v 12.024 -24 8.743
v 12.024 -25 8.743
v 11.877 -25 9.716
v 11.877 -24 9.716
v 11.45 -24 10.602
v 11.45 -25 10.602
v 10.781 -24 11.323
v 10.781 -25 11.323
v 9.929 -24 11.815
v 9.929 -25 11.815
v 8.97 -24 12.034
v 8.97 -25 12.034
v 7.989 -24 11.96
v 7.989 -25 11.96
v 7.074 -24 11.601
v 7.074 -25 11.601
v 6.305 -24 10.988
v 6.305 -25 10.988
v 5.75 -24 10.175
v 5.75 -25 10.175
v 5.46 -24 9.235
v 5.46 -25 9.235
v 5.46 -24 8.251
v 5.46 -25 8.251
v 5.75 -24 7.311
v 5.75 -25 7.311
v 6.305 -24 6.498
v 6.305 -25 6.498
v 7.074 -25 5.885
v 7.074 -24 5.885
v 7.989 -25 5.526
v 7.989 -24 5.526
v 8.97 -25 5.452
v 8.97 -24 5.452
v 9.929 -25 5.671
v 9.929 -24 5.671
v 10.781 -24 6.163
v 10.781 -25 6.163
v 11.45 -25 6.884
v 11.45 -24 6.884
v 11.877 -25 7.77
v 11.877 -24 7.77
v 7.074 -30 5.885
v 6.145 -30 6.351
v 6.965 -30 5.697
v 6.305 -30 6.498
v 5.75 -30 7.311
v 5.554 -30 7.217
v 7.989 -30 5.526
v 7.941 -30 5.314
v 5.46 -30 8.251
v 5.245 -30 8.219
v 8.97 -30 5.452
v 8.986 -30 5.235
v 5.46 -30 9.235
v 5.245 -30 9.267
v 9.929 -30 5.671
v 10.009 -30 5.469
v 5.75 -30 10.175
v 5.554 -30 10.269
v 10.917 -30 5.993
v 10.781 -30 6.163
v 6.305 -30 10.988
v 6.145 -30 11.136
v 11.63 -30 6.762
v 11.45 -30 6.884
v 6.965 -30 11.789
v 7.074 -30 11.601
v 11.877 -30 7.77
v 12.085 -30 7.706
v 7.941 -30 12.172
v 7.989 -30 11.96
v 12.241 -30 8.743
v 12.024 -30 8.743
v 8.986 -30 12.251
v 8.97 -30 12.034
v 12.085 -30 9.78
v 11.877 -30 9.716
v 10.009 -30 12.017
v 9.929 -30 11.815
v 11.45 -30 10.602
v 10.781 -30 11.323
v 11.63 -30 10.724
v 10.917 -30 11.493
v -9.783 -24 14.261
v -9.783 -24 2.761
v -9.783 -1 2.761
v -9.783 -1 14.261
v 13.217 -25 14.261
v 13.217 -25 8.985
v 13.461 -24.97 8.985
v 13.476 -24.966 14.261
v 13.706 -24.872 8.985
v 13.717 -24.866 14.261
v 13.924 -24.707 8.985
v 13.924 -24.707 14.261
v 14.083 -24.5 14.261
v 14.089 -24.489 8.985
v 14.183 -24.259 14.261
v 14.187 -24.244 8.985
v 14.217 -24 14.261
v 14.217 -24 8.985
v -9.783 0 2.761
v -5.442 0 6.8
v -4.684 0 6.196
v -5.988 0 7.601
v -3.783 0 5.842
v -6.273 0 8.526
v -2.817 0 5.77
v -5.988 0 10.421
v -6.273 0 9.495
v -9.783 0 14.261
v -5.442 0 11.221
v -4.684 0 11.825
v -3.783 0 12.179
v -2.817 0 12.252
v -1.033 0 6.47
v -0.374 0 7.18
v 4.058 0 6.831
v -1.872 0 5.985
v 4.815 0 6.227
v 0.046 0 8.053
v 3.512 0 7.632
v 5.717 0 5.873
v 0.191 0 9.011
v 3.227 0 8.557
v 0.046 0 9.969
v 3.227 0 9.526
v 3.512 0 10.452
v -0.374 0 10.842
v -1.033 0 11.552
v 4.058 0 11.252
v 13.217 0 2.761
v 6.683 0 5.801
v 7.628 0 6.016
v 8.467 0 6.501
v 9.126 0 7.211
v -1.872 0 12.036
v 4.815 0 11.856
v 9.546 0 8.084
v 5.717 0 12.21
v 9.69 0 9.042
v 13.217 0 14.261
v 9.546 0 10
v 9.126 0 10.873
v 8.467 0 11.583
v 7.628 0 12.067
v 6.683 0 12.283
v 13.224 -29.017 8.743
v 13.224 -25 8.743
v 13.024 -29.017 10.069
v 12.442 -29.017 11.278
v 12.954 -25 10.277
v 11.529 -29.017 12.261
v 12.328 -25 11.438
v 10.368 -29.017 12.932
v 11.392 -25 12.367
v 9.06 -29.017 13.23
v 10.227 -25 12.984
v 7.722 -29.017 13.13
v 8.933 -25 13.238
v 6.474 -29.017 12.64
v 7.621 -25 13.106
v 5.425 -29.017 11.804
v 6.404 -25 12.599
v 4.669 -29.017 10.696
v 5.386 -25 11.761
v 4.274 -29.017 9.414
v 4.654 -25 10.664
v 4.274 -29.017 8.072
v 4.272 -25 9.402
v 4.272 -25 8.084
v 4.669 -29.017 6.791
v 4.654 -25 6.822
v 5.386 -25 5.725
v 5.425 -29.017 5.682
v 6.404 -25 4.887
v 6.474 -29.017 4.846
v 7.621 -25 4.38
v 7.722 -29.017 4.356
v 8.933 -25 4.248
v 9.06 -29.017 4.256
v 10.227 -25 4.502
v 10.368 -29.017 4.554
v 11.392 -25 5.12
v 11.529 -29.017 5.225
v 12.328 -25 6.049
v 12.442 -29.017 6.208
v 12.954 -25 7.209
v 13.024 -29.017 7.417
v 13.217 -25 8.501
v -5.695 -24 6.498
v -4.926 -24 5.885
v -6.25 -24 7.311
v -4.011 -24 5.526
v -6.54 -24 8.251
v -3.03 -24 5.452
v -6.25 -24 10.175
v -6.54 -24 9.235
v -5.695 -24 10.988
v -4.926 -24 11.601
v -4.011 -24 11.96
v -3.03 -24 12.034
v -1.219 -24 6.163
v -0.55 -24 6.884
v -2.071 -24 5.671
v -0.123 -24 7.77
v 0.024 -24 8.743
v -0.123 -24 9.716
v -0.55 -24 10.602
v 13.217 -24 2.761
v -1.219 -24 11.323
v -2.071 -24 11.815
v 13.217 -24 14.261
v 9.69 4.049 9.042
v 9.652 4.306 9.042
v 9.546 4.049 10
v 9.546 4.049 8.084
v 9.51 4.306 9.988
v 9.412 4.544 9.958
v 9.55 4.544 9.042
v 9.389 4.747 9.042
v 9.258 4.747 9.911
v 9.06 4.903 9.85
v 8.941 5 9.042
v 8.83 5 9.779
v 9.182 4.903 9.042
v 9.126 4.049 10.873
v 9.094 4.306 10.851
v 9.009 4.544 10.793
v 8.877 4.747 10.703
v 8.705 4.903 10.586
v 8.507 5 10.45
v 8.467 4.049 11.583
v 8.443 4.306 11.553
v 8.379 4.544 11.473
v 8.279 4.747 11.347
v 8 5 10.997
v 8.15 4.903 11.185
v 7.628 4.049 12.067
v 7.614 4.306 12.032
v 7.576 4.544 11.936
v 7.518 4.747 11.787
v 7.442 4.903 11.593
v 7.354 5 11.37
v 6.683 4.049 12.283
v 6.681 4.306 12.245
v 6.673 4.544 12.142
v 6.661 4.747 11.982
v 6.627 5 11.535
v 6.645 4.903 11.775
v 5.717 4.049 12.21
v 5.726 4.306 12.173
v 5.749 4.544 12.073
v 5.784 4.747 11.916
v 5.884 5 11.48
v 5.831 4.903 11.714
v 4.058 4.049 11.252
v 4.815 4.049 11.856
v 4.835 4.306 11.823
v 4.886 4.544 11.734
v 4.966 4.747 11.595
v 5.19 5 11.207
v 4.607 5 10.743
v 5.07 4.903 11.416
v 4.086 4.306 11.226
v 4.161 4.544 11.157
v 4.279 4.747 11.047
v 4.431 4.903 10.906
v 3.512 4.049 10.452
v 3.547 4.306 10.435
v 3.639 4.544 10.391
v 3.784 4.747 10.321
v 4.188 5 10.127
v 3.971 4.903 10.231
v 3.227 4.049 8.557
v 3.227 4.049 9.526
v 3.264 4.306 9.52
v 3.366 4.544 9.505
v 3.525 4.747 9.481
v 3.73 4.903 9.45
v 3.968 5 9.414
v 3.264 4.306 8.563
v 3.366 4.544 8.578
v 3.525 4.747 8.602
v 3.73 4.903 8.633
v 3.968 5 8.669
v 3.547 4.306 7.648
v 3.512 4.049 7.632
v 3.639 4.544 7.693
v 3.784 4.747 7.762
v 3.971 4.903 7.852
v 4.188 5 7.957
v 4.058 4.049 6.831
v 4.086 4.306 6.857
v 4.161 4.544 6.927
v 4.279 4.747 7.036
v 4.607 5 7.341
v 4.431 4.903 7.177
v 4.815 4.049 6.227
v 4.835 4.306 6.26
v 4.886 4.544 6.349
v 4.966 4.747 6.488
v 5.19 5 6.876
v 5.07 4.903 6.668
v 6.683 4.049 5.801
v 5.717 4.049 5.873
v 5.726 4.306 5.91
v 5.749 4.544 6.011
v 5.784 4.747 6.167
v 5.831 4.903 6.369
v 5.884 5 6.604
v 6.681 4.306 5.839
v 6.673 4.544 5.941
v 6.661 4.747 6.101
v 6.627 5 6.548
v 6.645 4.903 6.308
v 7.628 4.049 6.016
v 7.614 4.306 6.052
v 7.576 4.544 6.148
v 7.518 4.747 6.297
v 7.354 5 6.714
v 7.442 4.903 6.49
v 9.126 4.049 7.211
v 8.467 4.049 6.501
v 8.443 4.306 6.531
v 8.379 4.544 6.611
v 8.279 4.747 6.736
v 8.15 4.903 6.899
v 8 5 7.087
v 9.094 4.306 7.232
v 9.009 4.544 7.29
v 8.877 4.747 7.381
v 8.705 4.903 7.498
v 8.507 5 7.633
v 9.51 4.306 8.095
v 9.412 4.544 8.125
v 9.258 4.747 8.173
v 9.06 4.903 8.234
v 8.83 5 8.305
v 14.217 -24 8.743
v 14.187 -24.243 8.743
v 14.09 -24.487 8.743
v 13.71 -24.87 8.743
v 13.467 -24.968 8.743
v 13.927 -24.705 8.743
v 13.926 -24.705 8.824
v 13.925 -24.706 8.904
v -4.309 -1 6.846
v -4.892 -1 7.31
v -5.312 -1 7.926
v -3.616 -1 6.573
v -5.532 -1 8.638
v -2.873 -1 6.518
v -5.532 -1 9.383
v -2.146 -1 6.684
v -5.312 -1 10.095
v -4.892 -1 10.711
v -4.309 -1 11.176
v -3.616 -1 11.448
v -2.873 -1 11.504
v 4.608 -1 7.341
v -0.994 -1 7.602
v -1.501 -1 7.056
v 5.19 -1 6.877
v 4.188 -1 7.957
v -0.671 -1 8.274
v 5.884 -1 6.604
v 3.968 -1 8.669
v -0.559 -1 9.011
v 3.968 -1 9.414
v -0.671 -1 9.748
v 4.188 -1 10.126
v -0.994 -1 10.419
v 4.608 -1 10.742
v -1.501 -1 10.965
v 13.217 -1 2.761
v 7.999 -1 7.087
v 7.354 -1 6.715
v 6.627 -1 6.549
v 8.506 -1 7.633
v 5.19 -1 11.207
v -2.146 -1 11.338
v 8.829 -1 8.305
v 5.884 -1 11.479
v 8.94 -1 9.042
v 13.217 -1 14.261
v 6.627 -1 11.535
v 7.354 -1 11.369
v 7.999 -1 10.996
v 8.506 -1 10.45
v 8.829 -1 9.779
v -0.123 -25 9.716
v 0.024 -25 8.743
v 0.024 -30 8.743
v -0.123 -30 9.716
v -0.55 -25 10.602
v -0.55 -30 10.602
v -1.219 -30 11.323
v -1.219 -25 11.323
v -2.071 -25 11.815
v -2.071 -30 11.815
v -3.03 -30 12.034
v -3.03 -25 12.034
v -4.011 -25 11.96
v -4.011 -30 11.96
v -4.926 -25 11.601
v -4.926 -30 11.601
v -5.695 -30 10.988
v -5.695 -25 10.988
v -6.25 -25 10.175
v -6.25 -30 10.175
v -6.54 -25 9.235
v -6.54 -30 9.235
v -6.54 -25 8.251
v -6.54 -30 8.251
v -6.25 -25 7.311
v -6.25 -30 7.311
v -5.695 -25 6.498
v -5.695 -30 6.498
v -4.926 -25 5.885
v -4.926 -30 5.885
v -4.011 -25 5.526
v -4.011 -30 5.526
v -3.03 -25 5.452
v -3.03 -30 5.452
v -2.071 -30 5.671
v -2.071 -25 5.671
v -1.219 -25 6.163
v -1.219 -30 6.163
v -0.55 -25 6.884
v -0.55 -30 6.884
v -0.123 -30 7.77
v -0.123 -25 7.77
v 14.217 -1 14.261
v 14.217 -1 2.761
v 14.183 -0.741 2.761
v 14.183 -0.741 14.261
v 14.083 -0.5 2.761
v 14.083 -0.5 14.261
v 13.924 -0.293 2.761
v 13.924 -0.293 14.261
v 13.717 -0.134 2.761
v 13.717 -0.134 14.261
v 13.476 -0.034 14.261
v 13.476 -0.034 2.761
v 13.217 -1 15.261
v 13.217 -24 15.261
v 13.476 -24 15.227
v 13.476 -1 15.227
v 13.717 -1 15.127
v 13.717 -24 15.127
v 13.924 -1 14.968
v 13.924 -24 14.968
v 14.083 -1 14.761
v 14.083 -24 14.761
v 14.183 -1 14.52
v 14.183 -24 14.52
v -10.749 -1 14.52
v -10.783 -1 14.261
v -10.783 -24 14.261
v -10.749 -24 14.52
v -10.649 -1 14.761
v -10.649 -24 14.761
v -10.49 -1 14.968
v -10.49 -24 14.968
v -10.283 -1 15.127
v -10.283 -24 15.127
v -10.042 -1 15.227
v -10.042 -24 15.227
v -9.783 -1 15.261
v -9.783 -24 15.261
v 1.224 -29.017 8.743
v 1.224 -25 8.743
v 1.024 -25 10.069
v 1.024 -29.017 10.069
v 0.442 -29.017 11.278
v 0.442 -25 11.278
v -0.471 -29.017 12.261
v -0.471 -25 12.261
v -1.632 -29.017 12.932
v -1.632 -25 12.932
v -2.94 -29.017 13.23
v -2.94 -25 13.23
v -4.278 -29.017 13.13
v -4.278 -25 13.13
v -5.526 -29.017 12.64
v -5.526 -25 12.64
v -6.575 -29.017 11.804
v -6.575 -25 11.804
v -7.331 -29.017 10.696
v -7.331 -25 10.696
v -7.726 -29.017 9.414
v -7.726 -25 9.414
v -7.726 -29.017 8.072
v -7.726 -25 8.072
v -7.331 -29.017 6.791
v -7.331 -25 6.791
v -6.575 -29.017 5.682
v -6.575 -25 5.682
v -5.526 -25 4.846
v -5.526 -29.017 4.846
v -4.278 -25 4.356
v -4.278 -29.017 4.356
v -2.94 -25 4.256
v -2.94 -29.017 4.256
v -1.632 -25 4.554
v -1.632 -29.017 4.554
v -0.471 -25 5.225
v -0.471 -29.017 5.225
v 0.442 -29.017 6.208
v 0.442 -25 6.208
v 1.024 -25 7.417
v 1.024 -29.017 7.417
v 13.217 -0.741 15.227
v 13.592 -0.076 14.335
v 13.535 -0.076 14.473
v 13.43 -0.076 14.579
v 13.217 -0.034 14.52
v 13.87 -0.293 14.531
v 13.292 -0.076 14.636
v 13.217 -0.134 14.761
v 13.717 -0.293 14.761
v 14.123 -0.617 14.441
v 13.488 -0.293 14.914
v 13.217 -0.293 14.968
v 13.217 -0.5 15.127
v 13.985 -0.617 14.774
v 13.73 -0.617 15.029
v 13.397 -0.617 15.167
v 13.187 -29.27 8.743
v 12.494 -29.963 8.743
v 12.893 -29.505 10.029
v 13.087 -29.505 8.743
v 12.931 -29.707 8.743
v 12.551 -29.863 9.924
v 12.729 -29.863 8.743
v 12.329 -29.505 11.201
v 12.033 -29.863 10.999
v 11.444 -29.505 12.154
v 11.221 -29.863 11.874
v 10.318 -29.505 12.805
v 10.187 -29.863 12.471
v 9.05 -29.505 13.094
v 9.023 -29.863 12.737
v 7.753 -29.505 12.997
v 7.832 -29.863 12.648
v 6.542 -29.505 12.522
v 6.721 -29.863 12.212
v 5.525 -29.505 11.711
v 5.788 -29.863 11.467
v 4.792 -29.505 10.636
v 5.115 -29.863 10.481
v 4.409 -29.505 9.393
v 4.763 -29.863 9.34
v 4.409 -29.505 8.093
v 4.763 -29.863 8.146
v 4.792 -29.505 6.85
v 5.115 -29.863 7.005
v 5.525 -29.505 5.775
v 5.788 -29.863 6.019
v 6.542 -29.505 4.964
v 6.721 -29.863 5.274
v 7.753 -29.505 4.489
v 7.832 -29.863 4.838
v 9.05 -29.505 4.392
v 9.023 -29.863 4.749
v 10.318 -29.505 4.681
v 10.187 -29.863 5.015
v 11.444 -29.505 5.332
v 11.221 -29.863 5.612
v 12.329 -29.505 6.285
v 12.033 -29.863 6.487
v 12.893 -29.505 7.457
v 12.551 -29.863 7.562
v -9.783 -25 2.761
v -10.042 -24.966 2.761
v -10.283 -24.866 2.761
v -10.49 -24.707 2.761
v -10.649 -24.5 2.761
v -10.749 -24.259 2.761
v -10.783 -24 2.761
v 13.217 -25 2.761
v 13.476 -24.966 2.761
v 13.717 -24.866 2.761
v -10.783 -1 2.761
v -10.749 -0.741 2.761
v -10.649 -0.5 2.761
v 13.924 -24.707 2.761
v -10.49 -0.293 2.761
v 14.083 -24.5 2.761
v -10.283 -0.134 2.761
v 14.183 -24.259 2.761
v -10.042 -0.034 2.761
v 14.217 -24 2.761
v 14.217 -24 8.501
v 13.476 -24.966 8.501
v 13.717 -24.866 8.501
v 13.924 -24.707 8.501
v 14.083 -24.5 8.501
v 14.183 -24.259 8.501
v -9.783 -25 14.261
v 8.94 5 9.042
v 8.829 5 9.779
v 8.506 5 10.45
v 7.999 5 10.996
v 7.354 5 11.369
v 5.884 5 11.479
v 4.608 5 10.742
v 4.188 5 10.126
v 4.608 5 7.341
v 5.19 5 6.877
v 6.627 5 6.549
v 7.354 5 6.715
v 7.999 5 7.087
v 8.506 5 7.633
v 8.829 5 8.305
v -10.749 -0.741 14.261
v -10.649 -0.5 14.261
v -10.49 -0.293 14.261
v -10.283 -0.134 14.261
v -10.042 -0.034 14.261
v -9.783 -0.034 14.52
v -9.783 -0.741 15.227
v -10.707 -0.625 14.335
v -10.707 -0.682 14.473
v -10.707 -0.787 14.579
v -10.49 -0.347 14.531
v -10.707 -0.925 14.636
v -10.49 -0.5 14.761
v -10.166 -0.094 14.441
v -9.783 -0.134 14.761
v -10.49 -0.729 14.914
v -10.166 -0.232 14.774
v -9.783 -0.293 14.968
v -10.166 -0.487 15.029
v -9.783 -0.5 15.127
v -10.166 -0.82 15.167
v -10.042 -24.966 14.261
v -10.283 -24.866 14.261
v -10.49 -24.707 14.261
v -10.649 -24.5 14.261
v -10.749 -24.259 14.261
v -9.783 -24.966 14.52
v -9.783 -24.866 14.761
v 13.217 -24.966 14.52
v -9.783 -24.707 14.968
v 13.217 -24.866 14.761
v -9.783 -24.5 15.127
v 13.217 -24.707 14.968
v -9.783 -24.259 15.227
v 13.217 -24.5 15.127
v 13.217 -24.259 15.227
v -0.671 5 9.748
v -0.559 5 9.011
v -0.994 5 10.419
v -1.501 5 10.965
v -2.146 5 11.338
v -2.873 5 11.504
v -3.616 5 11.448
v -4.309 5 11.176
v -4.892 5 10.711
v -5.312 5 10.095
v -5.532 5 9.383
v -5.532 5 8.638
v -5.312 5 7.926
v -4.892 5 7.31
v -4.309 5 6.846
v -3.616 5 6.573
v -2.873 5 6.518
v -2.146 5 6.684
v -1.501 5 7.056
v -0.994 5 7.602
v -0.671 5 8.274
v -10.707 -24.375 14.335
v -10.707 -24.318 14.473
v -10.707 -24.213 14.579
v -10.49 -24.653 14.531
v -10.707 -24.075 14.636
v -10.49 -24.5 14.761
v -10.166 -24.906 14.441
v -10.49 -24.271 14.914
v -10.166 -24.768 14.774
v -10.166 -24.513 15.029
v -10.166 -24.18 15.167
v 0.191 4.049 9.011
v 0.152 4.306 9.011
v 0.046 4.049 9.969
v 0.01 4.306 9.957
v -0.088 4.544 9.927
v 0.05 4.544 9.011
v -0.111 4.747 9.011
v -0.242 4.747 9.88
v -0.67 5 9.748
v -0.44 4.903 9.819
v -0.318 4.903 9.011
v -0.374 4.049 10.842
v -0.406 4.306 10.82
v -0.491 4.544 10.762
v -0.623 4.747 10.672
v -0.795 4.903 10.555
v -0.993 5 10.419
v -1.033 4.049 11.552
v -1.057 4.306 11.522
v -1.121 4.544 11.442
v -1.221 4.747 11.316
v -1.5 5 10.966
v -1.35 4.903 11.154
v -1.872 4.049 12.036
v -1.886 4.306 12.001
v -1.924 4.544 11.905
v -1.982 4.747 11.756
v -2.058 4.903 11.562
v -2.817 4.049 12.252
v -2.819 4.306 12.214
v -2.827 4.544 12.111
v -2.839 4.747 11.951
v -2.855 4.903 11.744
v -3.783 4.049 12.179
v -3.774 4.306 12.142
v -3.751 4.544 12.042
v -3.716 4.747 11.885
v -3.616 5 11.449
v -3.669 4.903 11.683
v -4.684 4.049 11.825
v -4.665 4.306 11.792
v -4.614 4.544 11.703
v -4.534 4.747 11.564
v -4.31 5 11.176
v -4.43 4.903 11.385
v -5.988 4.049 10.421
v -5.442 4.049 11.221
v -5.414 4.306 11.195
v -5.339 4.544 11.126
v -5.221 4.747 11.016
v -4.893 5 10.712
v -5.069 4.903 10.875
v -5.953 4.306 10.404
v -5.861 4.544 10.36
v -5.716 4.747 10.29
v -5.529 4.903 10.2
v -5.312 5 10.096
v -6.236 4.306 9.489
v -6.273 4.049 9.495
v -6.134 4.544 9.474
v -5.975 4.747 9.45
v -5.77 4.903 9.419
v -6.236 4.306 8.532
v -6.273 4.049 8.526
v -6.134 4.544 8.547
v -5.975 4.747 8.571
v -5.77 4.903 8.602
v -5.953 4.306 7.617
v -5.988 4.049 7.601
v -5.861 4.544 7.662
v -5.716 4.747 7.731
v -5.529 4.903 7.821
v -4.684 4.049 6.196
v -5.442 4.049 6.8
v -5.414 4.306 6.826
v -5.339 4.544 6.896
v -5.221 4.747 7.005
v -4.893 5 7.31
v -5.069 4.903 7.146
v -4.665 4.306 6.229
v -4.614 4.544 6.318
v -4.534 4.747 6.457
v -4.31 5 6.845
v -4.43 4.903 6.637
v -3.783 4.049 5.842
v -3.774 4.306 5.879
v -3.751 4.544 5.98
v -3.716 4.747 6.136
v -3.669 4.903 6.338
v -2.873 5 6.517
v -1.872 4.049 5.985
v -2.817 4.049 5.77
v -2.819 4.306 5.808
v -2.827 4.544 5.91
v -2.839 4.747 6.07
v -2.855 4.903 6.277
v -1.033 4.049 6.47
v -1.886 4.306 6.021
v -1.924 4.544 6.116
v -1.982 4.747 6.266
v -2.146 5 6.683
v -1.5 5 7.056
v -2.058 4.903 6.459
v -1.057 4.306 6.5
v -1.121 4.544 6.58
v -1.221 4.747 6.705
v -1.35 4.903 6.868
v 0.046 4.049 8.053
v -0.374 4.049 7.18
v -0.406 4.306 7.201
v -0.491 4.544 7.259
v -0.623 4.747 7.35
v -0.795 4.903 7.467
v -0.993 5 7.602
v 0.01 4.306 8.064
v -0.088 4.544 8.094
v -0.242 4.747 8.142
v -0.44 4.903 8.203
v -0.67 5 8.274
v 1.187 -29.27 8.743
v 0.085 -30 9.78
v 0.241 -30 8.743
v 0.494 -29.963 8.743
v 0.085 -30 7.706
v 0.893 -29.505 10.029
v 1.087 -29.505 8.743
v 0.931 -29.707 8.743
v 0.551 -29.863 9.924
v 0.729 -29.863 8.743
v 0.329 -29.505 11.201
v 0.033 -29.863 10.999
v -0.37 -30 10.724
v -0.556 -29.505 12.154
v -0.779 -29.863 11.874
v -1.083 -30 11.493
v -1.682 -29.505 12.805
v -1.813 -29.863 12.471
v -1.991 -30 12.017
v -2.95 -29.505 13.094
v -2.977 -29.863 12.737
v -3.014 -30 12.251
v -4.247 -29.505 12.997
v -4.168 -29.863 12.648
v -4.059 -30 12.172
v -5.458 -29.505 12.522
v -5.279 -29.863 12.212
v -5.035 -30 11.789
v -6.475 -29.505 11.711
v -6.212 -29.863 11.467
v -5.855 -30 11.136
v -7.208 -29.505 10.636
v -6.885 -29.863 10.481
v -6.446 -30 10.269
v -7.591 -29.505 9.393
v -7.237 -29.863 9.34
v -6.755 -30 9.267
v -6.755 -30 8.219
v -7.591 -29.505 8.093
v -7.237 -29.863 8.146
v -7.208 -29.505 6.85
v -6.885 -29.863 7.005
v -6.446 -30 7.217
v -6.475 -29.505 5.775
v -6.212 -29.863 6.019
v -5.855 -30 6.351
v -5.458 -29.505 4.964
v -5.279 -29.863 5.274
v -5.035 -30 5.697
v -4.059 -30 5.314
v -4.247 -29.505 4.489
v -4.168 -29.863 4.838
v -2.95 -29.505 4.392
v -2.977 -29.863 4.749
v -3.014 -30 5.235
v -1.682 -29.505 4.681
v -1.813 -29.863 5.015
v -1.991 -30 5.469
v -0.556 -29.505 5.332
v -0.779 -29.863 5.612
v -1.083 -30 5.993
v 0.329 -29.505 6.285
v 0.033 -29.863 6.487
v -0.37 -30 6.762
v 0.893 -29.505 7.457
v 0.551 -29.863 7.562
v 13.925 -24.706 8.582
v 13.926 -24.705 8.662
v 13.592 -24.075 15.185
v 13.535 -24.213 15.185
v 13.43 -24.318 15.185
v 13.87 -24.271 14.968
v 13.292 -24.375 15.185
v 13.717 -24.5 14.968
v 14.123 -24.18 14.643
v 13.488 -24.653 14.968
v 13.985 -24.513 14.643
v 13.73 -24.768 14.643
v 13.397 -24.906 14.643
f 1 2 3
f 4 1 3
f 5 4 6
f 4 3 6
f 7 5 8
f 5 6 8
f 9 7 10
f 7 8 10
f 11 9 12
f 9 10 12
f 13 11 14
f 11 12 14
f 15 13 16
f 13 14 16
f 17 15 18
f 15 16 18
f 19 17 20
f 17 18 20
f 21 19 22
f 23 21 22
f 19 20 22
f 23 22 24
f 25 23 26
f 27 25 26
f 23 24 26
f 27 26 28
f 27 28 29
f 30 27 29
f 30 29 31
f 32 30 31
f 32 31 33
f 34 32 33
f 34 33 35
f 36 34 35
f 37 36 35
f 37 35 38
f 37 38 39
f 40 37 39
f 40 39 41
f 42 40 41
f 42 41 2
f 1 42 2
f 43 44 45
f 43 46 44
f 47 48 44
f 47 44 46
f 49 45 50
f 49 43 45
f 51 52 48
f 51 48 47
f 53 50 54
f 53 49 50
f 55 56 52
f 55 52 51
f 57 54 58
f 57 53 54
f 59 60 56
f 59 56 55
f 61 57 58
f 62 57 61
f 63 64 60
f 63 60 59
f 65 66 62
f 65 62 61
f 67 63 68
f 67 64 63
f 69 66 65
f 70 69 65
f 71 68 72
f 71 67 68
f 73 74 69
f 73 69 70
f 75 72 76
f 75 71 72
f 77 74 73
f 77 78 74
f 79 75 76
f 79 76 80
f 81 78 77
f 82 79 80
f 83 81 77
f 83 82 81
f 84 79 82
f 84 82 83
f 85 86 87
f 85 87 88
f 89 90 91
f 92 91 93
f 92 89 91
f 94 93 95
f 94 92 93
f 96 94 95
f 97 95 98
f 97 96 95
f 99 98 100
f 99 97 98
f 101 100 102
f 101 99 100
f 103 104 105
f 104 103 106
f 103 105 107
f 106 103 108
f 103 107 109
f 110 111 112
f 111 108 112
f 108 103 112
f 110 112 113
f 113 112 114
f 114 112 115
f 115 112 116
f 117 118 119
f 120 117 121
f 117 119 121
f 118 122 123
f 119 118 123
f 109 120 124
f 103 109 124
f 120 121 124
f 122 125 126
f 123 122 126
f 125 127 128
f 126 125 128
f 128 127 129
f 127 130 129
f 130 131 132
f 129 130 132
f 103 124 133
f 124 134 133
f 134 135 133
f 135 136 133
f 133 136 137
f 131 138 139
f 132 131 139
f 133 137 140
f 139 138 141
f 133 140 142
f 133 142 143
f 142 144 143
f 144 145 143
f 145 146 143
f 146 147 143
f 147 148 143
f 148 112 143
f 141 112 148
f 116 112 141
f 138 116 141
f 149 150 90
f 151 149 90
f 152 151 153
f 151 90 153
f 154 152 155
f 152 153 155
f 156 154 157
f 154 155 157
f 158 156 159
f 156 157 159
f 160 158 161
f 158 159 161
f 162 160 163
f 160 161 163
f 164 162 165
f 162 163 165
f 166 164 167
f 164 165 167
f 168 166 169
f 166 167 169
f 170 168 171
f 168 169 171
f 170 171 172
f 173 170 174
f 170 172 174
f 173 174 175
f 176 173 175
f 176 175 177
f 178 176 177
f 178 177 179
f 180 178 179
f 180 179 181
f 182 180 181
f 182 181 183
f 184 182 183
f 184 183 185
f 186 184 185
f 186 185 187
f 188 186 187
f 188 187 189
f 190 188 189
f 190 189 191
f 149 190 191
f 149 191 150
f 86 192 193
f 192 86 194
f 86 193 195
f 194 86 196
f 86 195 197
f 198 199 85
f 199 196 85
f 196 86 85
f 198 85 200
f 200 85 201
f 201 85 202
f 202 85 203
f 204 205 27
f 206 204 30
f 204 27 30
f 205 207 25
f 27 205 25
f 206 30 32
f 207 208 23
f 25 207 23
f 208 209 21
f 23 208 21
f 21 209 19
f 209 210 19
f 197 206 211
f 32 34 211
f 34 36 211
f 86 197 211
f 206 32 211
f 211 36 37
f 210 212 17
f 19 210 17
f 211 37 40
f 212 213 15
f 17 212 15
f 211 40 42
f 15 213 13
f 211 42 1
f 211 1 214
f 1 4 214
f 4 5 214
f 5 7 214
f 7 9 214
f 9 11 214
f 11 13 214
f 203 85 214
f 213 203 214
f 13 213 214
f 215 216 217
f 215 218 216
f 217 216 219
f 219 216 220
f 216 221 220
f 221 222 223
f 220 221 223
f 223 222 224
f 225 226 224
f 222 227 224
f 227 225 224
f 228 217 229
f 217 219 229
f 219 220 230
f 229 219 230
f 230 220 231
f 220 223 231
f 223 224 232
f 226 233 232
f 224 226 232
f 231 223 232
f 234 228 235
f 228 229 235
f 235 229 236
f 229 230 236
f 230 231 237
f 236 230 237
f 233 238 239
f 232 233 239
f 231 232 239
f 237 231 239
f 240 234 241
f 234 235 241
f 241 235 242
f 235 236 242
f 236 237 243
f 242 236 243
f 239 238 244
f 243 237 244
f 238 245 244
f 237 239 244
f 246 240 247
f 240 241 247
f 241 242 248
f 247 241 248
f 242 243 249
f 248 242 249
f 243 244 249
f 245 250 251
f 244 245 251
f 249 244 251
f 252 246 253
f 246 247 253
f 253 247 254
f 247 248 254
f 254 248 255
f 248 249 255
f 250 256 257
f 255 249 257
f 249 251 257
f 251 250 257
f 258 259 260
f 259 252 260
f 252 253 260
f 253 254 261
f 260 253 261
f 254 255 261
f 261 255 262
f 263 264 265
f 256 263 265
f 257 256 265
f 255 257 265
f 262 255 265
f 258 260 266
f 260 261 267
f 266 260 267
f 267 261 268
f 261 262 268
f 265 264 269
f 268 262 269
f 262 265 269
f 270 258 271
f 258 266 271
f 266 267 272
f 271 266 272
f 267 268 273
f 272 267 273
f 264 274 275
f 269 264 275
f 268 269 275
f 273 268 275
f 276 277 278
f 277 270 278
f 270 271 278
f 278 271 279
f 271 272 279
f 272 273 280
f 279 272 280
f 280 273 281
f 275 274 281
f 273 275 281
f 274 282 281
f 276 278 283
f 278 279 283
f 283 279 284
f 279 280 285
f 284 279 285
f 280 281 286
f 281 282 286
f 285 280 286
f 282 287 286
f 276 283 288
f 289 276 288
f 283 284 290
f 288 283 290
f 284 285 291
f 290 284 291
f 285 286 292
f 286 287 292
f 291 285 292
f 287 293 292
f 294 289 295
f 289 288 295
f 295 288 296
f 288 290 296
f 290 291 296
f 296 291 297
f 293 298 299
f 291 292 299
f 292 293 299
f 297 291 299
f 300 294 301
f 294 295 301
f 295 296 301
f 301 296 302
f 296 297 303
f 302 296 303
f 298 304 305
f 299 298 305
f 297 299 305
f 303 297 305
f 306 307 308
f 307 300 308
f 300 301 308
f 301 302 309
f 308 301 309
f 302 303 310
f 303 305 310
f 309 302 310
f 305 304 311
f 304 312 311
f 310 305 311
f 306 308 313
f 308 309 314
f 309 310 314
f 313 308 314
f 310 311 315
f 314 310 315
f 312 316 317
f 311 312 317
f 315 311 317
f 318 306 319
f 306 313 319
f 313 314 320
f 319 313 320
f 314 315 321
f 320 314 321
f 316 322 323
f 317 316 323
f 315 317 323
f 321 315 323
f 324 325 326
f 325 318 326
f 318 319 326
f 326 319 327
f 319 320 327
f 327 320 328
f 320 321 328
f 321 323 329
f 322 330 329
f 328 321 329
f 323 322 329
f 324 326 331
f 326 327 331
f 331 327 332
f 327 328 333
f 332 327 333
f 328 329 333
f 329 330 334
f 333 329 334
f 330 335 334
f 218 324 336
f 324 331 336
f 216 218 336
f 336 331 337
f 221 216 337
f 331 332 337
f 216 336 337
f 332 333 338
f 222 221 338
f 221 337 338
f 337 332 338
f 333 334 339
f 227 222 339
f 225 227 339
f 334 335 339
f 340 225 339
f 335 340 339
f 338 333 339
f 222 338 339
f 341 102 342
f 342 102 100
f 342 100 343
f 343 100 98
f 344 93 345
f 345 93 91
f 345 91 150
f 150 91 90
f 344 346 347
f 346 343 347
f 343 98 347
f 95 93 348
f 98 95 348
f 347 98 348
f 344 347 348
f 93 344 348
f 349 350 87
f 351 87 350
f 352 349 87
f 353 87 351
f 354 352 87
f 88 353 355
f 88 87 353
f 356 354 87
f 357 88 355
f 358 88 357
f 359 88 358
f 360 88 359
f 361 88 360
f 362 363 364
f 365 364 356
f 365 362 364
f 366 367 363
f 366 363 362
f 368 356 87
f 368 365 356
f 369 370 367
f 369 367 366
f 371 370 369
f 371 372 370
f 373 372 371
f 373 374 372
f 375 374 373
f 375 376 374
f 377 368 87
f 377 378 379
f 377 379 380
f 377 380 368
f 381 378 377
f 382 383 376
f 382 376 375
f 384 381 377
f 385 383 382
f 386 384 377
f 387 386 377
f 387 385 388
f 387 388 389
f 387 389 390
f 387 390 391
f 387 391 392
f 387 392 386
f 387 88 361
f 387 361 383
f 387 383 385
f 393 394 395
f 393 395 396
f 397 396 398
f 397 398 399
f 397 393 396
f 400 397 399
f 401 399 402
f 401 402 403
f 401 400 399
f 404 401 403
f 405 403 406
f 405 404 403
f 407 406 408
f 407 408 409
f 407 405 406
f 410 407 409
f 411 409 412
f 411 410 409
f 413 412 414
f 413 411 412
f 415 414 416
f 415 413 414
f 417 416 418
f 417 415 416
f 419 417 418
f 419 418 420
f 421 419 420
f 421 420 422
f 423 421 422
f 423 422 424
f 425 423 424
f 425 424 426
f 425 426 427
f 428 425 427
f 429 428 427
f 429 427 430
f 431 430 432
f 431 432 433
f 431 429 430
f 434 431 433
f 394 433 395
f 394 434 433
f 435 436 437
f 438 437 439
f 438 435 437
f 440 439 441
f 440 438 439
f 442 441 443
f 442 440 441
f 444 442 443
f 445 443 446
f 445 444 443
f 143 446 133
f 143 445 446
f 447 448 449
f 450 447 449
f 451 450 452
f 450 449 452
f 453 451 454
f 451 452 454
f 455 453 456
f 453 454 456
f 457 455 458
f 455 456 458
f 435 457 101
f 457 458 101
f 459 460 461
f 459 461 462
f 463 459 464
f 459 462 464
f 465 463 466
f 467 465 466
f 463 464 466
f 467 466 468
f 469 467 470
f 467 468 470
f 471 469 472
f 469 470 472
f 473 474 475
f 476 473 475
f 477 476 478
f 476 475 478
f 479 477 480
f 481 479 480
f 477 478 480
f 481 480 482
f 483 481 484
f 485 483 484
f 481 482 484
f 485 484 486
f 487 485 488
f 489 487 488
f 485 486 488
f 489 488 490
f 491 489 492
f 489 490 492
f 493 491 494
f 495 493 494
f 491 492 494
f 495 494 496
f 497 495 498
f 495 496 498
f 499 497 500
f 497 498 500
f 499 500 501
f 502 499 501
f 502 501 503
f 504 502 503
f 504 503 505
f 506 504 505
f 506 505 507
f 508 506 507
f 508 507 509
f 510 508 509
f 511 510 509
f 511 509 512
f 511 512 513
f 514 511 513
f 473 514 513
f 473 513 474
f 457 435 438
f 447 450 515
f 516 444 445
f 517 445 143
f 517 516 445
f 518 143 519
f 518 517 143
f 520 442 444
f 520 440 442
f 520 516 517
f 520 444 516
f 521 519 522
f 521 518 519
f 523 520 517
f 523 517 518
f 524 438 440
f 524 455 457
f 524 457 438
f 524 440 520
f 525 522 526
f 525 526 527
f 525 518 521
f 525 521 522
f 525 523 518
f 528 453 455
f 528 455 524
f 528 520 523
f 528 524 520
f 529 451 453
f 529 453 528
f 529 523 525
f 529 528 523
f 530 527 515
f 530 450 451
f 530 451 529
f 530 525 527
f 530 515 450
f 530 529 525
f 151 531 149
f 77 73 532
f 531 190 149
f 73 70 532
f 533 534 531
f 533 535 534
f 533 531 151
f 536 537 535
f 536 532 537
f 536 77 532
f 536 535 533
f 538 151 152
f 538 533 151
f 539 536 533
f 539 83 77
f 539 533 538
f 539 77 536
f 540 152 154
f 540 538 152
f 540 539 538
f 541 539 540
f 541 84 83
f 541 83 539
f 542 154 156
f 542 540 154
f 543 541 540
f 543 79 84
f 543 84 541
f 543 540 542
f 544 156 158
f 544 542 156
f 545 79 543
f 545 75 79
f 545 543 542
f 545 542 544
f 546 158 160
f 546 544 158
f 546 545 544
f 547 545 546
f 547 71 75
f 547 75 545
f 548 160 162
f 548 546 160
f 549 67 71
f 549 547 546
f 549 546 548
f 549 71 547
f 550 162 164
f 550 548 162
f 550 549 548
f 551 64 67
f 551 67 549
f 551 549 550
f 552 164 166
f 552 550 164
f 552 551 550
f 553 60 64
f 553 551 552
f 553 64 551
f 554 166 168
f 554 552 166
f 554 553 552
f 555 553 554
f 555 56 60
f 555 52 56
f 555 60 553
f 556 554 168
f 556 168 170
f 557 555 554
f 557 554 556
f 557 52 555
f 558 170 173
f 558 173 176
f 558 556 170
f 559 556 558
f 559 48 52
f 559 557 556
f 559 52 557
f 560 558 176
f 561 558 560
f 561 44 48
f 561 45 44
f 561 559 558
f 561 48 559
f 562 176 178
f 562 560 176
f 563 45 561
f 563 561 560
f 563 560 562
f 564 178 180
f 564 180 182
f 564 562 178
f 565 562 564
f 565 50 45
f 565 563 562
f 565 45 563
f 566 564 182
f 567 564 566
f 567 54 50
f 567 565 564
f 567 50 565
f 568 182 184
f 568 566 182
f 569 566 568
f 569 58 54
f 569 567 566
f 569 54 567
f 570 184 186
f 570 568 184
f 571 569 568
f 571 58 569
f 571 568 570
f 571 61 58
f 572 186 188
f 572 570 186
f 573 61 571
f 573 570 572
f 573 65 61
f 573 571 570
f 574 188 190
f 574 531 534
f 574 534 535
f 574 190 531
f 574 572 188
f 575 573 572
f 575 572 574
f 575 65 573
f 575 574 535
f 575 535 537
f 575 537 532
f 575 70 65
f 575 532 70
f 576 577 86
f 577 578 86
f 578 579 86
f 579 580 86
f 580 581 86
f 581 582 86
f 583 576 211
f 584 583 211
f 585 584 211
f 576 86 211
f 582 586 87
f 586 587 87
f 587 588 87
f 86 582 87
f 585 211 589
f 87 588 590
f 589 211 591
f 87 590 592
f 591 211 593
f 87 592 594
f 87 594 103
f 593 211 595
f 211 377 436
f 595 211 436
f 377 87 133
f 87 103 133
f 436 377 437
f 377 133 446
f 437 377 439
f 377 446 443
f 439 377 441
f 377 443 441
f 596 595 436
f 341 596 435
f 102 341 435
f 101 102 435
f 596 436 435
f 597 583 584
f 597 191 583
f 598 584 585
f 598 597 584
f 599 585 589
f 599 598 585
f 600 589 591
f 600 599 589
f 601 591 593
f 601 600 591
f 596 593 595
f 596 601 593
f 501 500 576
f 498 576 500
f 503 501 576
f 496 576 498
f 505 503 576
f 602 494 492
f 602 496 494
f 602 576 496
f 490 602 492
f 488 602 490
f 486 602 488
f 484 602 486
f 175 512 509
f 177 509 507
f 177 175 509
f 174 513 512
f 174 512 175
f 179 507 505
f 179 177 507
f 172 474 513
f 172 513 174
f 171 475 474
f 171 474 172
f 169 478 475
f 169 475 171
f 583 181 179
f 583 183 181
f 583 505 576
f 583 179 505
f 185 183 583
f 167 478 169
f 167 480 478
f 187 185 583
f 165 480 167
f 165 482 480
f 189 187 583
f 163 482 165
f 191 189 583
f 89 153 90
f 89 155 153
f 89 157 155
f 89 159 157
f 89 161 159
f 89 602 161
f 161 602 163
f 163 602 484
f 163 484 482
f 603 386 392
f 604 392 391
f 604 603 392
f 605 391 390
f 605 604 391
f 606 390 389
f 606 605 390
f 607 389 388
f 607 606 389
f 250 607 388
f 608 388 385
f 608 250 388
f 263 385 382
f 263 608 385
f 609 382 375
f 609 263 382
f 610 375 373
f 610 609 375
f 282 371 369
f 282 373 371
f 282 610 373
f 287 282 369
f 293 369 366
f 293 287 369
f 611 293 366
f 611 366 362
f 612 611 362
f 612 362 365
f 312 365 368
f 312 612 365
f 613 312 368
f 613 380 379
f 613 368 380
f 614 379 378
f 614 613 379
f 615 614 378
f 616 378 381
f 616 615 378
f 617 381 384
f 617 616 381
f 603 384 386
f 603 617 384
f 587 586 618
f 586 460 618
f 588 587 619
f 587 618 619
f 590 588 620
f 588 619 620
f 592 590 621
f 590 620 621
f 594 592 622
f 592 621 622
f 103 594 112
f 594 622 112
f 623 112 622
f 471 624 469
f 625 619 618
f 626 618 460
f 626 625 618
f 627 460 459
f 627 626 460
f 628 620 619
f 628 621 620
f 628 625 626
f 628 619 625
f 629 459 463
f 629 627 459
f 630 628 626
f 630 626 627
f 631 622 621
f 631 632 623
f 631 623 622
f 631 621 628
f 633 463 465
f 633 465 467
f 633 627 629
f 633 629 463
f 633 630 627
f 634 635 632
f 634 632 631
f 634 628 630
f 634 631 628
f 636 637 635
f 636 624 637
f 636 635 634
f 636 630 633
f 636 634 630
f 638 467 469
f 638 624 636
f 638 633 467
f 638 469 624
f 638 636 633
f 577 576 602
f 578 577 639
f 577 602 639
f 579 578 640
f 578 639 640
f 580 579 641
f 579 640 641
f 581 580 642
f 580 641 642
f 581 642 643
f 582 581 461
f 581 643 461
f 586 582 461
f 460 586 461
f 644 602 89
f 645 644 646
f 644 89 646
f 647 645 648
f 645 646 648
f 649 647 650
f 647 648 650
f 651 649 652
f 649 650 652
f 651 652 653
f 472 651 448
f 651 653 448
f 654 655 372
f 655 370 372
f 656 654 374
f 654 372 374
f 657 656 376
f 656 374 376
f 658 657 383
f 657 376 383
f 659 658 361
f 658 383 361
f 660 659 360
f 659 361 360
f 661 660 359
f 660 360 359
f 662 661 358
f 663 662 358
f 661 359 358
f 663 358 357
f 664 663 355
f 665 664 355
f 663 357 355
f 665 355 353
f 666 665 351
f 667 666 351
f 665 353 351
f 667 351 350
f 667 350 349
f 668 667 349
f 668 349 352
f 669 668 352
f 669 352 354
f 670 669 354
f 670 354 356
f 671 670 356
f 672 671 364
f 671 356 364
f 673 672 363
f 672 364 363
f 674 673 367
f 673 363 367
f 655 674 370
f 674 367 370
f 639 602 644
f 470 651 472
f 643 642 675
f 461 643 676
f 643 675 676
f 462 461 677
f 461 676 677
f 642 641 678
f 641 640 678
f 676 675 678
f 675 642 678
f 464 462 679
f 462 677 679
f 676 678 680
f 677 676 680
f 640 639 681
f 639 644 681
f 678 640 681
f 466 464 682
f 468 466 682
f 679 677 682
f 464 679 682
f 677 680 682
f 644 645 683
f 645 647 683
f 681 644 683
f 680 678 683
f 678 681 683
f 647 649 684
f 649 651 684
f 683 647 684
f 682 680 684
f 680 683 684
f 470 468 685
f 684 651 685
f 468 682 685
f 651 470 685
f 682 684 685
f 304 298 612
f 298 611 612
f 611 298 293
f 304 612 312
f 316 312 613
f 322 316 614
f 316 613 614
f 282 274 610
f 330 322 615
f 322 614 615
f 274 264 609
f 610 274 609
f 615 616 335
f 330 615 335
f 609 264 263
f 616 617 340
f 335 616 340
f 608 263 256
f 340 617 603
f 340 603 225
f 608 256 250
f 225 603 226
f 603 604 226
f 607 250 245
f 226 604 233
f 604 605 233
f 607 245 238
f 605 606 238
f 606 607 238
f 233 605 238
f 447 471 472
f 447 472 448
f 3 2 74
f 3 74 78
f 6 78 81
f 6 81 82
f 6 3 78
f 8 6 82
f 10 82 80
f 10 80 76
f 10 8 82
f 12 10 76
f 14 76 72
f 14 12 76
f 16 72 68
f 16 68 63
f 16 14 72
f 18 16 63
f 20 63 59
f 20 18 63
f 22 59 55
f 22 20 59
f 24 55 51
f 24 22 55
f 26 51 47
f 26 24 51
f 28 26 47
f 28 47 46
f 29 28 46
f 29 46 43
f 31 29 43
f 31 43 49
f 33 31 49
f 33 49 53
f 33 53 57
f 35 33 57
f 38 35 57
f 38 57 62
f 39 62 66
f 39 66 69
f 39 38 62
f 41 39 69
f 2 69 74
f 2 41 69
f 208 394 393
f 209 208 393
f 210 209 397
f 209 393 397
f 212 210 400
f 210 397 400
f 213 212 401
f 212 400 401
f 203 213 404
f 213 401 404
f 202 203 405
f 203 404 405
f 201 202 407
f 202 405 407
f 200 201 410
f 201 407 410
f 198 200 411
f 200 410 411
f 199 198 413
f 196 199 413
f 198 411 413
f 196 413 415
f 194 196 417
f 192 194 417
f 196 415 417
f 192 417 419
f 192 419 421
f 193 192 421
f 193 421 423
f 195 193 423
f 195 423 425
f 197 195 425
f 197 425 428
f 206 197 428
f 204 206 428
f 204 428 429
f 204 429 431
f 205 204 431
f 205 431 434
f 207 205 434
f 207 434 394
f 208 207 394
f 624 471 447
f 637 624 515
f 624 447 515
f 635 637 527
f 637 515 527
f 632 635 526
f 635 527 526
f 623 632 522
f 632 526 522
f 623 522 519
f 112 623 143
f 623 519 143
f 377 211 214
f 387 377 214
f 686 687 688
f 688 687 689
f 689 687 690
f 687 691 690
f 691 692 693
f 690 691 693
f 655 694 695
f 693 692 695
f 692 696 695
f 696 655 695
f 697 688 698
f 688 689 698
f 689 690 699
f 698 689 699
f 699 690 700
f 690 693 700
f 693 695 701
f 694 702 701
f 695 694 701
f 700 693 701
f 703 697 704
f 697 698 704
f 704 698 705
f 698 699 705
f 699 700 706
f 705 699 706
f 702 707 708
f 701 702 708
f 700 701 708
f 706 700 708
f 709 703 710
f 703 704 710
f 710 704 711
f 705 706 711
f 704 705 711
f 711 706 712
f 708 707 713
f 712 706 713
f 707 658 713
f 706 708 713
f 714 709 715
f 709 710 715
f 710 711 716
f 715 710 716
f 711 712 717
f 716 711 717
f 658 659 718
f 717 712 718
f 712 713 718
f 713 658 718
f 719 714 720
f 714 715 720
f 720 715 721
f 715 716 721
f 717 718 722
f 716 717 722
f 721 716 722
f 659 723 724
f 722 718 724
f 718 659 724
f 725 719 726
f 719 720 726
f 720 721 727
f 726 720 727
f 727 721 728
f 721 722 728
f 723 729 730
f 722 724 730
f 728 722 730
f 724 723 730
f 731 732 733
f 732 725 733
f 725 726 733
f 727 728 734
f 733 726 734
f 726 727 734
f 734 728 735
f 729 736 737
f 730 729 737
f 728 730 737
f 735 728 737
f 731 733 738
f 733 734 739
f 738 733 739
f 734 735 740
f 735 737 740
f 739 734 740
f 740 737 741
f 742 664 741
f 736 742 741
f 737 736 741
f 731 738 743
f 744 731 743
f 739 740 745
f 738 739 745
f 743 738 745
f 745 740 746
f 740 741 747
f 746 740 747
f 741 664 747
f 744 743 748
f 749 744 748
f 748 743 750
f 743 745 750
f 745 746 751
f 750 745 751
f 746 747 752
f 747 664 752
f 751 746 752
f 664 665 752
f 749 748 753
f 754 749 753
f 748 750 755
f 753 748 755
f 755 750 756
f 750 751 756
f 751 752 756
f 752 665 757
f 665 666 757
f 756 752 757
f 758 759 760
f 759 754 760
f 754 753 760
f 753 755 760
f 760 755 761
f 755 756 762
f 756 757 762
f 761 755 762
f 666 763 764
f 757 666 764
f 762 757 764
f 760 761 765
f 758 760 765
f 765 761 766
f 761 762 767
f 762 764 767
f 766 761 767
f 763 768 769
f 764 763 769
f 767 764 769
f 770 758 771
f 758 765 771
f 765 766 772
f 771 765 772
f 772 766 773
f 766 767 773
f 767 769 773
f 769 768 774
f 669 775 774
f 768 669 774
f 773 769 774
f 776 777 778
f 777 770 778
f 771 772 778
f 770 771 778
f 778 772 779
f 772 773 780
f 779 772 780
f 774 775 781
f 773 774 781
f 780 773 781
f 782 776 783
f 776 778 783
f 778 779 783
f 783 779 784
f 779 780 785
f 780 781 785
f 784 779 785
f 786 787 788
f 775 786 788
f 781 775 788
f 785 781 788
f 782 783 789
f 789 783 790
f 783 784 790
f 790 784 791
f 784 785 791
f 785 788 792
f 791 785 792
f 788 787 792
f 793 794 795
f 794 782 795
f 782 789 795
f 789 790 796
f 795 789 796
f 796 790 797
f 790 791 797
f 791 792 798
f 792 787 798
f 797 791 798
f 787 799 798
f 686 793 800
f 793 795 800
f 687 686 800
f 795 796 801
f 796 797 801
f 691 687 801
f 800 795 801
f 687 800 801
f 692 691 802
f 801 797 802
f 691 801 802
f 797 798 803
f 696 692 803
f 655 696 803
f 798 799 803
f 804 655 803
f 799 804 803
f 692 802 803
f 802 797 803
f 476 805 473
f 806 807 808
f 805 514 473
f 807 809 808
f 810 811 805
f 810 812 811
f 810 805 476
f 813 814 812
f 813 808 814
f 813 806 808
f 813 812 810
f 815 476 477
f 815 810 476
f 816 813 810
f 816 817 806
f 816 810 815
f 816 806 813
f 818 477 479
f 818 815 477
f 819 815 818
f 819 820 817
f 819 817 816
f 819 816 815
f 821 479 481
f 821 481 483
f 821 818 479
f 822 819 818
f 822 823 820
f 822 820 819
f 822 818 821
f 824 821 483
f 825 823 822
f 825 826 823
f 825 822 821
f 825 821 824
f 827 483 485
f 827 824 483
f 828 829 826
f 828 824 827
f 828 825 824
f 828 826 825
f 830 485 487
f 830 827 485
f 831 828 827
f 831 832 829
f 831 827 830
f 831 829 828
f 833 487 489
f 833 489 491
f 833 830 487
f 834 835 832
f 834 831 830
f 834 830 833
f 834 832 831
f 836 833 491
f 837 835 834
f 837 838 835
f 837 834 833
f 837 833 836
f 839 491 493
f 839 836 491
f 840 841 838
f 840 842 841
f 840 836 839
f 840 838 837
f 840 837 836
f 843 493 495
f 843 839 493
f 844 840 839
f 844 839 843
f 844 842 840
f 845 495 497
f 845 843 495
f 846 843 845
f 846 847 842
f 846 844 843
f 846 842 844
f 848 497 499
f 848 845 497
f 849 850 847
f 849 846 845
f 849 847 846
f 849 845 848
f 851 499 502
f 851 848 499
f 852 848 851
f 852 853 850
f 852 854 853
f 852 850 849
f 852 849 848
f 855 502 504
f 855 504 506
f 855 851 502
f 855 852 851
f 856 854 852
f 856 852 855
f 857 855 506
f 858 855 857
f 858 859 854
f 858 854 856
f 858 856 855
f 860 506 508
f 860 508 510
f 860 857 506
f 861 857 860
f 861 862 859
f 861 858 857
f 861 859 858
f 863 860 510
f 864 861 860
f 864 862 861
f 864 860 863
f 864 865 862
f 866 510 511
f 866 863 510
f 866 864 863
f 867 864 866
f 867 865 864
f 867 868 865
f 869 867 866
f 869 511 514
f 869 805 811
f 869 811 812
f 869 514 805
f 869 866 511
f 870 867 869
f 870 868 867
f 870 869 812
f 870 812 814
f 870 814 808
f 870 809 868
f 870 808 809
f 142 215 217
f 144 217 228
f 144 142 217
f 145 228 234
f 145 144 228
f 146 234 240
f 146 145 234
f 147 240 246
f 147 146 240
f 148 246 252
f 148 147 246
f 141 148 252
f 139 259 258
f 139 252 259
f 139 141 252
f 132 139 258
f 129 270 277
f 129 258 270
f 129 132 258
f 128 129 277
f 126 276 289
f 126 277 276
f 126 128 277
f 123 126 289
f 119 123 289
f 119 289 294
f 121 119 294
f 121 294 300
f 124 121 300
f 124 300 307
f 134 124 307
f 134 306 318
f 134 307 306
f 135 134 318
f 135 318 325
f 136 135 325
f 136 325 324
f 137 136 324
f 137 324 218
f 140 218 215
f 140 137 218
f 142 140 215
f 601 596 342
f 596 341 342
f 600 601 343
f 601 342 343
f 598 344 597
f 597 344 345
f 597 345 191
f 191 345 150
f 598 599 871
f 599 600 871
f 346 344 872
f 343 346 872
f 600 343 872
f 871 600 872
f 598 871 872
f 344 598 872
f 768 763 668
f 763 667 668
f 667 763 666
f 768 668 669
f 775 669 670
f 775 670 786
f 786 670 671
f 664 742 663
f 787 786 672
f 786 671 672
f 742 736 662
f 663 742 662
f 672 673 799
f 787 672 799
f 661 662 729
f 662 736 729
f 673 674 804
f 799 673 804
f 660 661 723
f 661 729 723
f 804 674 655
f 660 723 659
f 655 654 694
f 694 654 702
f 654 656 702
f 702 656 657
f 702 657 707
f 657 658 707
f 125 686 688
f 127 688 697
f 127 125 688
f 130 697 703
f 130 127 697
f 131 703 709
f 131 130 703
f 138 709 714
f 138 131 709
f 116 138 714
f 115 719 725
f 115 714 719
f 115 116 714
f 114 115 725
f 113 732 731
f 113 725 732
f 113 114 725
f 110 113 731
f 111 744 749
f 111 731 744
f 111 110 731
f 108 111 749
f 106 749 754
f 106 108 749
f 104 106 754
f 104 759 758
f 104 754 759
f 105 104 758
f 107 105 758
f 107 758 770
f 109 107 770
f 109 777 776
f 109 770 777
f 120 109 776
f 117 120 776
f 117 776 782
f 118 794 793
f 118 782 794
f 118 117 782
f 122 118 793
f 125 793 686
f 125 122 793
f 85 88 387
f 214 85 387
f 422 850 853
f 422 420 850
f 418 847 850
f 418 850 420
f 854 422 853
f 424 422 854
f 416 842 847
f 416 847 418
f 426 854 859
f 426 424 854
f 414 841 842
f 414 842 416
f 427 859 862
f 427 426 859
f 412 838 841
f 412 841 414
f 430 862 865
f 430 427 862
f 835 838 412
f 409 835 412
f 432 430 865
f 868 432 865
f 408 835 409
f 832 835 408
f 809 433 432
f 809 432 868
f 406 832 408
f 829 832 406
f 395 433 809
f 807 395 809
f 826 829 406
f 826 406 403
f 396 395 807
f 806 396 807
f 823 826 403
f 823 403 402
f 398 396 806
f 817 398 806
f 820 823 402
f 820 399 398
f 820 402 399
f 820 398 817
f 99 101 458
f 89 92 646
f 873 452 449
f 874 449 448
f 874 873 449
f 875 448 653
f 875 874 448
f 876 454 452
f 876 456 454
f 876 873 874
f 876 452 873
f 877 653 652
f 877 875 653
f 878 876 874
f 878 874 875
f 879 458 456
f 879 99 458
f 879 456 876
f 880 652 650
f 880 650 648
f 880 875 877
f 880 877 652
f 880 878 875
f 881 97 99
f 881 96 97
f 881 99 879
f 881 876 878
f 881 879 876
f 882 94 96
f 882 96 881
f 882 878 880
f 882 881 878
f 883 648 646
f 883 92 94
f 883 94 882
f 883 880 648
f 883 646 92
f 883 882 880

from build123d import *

# Parameters (mm, degrees)
F0_W     = 25
F0_H     = 12.5
F0_R     = 3.25
F0_R_2   = 2.5
F1_DEPTH = 25
F2_T     = -1
F3_DEPTH = 10
F4_DEPTH = 5
F5_R     = 3.3
F6_DEPTH = 10
F5_R_2   = 4.5
F7_DEPTH = 5
F8_R     = 1


# Not quite as in the source:
# - a fillet or chamfer that OpenCascade refuses, or shapes differently, is made with other operations: its cross-section is extruded or revolved along the edge and cut away or added


with BuildPart() as f1:
    # F0 (on Front) → F1 (new body)
    with BuildSketch(Plane.XZ):
        with Locations((1.7170939115, 9.0107331052)):
            Rectangle(F0_W, F0_H)
        with Locations((-3.0594504727, 9.0107331052)):
            Circle(F0_R, mode=Mode.SUBTRACT)
        with Locations((6.4404988661, 9.0417582542)):
            Circle(F0_R, mode=Mode.SUBTRACT)
        with Locations((-3.0594504727, 9.0107331052)):
            Circle(F0_R)
        with Locations((-3.0594504727, 9.0107331052)):
            Circle(F0_R_2, mode=Mode.SUBTRACT)
        with Locations((6.4404988661, 9.0417582542)):
            Circle(F0_R)
        with Locations((6.4404988661, 9.0417582542)):
            Circle(F0_R_2, mode=Mode.SUBTRACT)
        with Locations((-3.0594504727, 9.0107331052)):
            Circle(F0_R_2)
        with Locations((6.4404988661, 9.0417582542)):
            Circle(F0_R_2)
    extrude(amount=F1_DEPTH)

    # F2
    f2_openings = [f1.faces().sort_by_distance(p)[0] for p in [
        (1.717094, -12.5, 2.760733),
    ]]
    offset(amount=F2_T, openings=f2_openings)

    # F0 (on Front) → F3 (cut)
    with BuildSketch(Plane.XZ):
        with Locations((6.4404988661, 9.0417582542)):
            Circle(F0_R_2)
        with Locations((-3.0594504727, 9.0107331052)):
            Circle(F0_R_2)
    extrude(amount=F3_DEPTH, mode=Mode.SUBTRACT)

    # F0 (on Front) → F4 (join)
    with BuildSketch(Plane.XZ):
        with Locations((-3.0594504727, 9.0107331052)):
            Circle(F0_R)
        with Locations((-3.0594504727, 9.0107331052)):
            Circle(F0_R_2, mode=Mode.SUBTRACT)
        with Locations((6.4404988661, 9.0417582542)):
            Circle(F0_R)
        with Locations((6.4404988661, 9.0417582542)):
            Circle(F0_R_2, mode=Mode.SUBTRACT)
    extrude(amount=-F4_DEPTH)

    # F5 (on face) → F6 (cut)
    with BuildSketch(Plane.XZ.offset(25)):
        with Locations((-3.2763871515, 8.743028397)):
            Circle(F5_R)
        with Locations((8.7236128485, 8.743028397)):
            Circle(F5_R)
    extrude(amount=-F6_DEPTH, mode=Mode.SUBTRACT)

    # F5 (on face) → F7 (join)
    with BuildSketch(Plane.XZ.offset(25)):
        with Locations((-3.2763871515, 8.743028397)):
            Circle(F5_R_2)
        with Locations((-3.2763871515, 8.743028397)):
            Circle(F5_R, mode=Mode.SUBTRACT)
        with Locations((8.7236128485, 8.743028397)):
            Circle(F5_R_2)
        with Locations((8.7236128485, 8.743028397)):
            Circle(F5_R, mode=Mode.SUBTRACT)
    extrude(amount=F7_DEPTH)

    # F8
    f8_edges = [f1.edges().sort_by_distance(p)[0] for p in [
        (14.217094, -25, 9.010733),
        (14.217094, -12.5, 15.260733),
        (1.717094, -25, 15.260733),
        (-10.782906, -25, 9.010733),
        (14.217094, 0, 9.010733),
        (1.717094, 0, 15.260733),
        (-10.782906, 0, 9.010733),
        (-10.782906, -12.5, 15.260733),
    ]]
    fillet(f8_edges, radius=F8_R)

    # F9: fillet of radius 1 on 4 edges, made by hand

    # F9_s1 → F9_t2 (revolve, cut)
    with BuildSketch(Plane.XY.offset(9.0417582542)):
        with BuildLine():
            ThreePointArc((9.6906488661, 4.0318703599), (9.4811826994, 4.6442887287), (8.9405363493, 5.0001452412))
            Line((8.9405363493, 5.0001452412), (8.9455340989, 5.0195107389))
            ThreePointArc((8.9455340989, 5.0195107389), (9.3155176077, 5.02), (9.6904988661, 5.02))
            Line((9.6904988661, 5.02), (9.7104988661, 5))
            ThreePointArc((9.7104988661, 5), (9.7104988661, 4.51593518), (9.7106488661, 4.0318703599))
            Line((9.7106488661, 4.0318703599), (9.6906488661, 4.0318703599))
        make_face()
    revolve(axis=Axis((6.4404988661, 5, 9.0417582542), (0, -1, 0)), mode=Mode.SUBTRACT)

    # F9_s3 → F9_t4 (revolve, cut)
    with BuildSketch(Plane.XY.offset(9.0107331052)):
        with BuildLine():
            ThreePointArc((0.1906995273, 4.0318703599), (-0.0187666394, 4.6442887287), (-0.5594129896, 5.0001452412))
            Line((-0.5594129896, 5.0001452412), (-0.5544152399, 5.0195107389))
            ThreePointArc((-0.5544152399, 5.0195107389), (-0.1844317311, 5.02), (0.1905495273, 5.02))
            Line((0.1905495273, 5.02), (0.2105495273, 5))
            ThreePointArc((0.2105495273, 5), (0.2105495273, 4.51593518), (0.2106995273, 4.0318703599))
            Line((0.2106995273, 4.0318703599), (0.1906995273, 4.0318703599))
        make_face()
    revolve(axis=Axis((-3.0594504727, 5, 9.0107331052), (0, -1, 0)), mode=Mode.SUBTRACT)

    # F9_s5 → F9_t6 (revolve, cut)
    with BuildSketch(Plane.XY.offset(8.743028397)):
        with BuildLine():
            ThreePointArc((1.2237628485, -29.00015), (0.9308696297, -29.7072567812), (0.2237628485, -30.00015))
            Line((0.2237628485, -30.00015), (0.2237628485, -30.02015))
            ThreePointArc((0.2237628485, -30.02015), (0.7236878485, -30.02), (1.2236128485, -30.02))
            Line((1.2236128485, -30.02), (1.2436128485, -30))
            ThreePointArc((1.2436128485, -30), (1.2436128485, -29.500075), (1.2437628485, -29.00015))
            Line((1.2437628485, -29.00015), (1.2237628485, -29.00015))
        make_face()
    revolve(axis=Axis((-3.2763871515, -30, 8.743028397), (0, -1, 0)), mode=Mode.SUBTRACT)

    # F9_s7 → F9_t8 (revolve, cut)
    with BuildSketch(Plane.XY.offset(8.743028397)):
        with BuildLine():
            ThreePointArc((13.2237628485, -29.00015), (12.9308696297, -29.7072567812), (12.2237628485, -30.00015))
            Line((12.2237628485, -30.00015), (12.2237628485, -30.02015))
            ThreePointArc((12.2237628485, -30.02015), (12.7236878485, -30.02), (13.2236128485, -30.02))
            Line((13.2236128485, -30.02), (13.2436128485, -30))
            ThreePointArc((13.2436128485, -30), (13.2436128485, -29.500075), (13.2437628485, -29.00015))
            Line((13.2437628485, -29.00015), (13.2237628485, -29.00015))
        make_face()
    revolve(axis=Axis((8.7236128485, -30, 8.743028397), (0, -1, 0)), mode=Mode.SUBTRACT)


solid = f1.part
